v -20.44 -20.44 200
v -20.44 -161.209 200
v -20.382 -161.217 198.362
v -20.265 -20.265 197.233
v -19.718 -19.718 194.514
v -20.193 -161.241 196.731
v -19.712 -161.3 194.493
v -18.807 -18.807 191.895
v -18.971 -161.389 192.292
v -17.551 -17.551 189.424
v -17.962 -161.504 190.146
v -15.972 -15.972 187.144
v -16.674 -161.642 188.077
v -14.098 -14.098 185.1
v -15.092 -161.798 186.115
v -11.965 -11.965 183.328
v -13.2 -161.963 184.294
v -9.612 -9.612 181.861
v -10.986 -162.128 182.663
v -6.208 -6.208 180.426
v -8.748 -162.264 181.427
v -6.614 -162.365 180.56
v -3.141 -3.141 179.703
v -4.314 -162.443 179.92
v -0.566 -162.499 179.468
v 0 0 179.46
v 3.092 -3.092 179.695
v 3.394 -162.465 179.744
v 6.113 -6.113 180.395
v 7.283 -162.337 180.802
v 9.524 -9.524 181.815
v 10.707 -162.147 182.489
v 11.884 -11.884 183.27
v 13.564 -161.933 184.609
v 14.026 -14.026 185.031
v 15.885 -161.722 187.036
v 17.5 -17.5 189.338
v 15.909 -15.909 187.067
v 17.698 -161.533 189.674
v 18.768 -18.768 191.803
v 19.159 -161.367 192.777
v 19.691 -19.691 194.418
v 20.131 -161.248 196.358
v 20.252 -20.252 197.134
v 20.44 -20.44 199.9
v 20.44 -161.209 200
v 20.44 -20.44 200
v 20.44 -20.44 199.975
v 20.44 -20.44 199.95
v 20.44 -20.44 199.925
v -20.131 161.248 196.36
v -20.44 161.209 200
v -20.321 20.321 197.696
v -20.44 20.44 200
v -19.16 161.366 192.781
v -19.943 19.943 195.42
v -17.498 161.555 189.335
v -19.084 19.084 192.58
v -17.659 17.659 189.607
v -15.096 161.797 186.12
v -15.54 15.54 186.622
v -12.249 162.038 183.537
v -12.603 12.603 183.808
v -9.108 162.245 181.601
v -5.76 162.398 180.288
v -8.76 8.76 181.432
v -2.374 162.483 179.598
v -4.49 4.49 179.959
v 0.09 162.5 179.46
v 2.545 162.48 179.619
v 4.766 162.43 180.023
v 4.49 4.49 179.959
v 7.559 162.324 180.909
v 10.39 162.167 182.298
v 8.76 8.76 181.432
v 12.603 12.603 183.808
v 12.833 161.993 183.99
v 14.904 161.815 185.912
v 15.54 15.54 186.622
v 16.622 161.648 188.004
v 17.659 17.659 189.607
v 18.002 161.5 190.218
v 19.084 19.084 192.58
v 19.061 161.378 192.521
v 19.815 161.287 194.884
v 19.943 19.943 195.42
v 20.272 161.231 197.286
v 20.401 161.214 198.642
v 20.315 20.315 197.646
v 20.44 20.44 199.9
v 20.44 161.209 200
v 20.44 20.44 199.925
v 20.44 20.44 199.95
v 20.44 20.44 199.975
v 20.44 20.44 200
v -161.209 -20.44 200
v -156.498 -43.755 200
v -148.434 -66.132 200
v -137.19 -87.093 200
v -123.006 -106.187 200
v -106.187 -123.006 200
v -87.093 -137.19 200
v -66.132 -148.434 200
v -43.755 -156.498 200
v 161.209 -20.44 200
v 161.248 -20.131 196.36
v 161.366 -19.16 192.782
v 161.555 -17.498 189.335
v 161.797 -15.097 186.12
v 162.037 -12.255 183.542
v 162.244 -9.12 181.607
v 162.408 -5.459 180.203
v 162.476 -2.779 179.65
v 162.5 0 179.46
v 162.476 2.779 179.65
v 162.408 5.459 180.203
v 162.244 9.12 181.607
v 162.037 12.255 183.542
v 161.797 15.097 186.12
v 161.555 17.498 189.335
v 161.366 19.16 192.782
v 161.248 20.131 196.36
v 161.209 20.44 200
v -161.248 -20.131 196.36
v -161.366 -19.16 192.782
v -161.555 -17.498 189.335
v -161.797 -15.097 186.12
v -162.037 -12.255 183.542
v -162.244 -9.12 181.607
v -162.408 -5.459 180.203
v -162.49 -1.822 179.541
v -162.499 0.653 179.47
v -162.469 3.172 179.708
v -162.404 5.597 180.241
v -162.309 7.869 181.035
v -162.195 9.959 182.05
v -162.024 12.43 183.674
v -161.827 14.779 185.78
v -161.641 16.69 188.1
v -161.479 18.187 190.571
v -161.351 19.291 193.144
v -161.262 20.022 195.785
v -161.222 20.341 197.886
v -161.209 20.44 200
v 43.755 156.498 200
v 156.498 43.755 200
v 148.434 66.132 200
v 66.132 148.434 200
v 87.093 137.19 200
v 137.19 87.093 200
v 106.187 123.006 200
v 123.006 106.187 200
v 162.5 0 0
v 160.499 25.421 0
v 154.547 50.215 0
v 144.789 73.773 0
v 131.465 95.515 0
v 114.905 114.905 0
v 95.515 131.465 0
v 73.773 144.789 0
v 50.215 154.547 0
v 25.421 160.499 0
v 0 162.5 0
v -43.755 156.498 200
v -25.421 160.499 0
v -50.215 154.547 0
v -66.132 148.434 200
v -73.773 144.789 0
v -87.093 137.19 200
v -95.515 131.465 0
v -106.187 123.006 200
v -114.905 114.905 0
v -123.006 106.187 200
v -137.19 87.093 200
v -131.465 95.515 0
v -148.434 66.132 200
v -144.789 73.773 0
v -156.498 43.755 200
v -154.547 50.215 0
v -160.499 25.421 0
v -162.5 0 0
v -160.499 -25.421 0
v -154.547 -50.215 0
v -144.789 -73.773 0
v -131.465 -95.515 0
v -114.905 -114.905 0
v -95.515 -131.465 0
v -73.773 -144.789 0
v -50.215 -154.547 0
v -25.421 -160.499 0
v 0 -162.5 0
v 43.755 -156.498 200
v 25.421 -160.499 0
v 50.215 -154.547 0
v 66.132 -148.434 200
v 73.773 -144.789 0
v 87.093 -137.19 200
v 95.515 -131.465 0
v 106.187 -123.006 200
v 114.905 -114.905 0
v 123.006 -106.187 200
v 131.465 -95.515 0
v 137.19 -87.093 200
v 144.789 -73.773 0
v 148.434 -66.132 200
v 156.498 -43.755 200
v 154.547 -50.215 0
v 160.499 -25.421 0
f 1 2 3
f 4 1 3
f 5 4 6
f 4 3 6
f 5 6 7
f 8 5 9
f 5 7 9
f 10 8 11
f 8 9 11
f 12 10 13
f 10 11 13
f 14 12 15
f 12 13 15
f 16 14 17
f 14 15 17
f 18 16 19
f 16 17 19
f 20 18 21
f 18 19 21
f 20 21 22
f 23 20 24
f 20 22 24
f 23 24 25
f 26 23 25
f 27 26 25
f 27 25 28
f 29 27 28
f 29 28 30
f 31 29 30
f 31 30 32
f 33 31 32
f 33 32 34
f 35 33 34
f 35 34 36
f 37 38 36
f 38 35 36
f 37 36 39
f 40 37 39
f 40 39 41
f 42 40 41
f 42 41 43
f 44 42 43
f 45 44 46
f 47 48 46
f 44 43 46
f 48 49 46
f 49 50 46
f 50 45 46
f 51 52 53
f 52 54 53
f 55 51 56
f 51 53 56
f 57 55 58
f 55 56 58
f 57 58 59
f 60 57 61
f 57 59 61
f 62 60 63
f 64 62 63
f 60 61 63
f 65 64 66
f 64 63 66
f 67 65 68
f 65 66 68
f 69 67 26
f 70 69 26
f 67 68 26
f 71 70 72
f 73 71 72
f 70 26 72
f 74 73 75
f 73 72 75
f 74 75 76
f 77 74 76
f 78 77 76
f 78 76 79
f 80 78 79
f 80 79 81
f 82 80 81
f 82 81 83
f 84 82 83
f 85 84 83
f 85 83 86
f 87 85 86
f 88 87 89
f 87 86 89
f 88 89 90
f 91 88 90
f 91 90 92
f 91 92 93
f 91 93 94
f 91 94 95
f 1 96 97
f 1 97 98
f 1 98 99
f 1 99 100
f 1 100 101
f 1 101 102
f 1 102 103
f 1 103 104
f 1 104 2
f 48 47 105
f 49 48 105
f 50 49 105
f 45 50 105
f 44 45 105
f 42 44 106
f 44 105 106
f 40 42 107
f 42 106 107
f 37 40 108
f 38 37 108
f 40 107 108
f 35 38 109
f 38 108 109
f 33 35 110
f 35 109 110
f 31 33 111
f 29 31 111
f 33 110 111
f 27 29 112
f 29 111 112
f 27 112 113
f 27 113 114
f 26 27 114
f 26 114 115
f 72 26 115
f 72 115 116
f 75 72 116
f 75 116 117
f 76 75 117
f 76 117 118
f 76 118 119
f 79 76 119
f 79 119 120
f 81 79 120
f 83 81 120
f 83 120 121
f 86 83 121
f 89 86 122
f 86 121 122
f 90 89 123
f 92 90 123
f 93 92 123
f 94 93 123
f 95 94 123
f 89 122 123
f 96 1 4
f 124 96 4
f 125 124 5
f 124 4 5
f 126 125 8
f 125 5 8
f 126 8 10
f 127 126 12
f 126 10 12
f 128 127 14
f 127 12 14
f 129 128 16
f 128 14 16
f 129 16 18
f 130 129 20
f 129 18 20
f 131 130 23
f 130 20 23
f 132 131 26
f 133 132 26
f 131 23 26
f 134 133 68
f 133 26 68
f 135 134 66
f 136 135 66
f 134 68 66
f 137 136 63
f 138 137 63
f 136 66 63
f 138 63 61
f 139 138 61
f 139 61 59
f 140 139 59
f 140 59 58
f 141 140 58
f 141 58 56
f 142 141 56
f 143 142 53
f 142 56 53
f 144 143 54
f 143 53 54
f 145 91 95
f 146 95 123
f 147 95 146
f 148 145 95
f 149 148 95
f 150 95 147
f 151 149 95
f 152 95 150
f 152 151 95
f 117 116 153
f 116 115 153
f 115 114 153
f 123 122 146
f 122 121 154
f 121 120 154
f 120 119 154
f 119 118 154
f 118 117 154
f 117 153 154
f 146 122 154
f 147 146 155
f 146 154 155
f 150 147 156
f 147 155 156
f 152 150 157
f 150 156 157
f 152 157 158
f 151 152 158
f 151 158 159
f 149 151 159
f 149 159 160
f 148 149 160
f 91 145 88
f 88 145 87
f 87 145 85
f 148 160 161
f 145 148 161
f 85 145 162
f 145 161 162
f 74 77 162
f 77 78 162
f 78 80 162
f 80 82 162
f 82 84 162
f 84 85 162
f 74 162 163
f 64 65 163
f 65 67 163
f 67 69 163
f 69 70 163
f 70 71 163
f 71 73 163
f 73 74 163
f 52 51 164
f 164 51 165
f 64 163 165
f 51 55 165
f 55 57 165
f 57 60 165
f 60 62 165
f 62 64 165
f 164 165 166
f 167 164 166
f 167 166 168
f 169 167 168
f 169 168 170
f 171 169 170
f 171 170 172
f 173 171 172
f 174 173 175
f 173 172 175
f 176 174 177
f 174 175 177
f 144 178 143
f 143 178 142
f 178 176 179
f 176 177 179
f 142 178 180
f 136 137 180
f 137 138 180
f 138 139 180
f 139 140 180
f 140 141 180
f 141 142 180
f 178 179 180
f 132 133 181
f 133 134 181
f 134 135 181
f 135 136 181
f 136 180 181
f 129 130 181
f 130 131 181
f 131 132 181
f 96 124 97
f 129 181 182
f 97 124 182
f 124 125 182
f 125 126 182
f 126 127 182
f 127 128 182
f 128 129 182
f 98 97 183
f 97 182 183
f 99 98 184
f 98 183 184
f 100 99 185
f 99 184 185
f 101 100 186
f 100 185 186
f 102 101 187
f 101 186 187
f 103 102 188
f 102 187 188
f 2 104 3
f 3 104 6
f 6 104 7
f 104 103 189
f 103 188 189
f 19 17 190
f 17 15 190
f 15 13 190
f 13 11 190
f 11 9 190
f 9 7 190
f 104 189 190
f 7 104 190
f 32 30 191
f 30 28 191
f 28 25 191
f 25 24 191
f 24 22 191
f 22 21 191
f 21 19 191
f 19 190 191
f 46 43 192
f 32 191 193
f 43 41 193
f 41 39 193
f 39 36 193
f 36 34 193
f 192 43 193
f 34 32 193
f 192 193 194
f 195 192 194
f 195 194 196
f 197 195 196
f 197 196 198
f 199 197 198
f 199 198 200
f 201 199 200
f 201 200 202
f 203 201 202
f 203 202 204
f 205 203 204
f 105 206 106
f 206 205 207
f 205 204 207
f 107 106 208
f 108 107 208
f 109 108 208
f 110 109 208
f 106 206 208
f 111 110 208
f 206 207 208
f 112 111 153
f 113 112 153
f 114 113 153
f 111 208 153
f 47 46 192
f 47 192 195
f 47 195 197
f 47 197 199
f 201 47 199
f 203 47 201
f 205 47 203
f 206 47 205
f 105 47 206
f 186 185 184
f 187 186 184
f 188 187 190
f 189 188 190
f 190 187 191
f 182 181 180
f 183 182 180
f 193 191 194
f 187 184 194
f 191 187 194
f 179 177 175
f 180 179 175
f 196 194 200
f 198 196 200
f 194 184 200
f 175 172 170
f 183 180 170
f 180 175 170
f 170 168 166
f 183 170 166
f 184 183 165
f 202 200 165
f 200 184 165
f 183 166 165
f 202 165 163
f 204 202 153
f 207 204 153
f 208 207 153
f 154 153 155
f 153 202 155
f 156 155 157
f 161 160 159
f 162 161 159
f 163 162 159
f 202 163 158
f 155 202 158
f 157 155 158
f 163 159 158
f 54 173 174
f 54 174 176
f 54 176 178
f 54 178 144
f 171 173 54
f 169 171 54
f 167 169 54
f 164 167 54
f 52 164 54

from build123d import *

# Parameters (mm, degrees)
SKETCH_R      = 162.5
PAD_DEPTH     = 200
SKETCH001_R   = 20.44
HOLE_DEPTH    = 337.501
SKETCH002_R   = 20.44
HOLE001_DEPTH = 337.501


with BuildPart() as part:
    # Sketch → Pad (new body)
    with BuildSketch(Plane.XY):
        Circle(SKETCH_R)
    extrude(amount=PAD_DEPTH)

    # Sketch001 → Hole (cut, through all)
    with BuildSketch(Plane.YZ.offset(175)):
        with Locations((0, 199.9)):
            Circle(SKETCH001_R)
    extrude(amount=-HOLE_DEPTH, mode=Mode.SUBTRACT)

    # Sketch002 → Hole001 (cut, through all)
    with BuildSketch(Plane.XZ.offset(175)):
        with Locations((0, 199.9)):
            Circle(SKETCH002_R)
    extrude(amount=-HOLE001_DEPTH, mode=Mode.SUBTRACT)


solid = part.part
